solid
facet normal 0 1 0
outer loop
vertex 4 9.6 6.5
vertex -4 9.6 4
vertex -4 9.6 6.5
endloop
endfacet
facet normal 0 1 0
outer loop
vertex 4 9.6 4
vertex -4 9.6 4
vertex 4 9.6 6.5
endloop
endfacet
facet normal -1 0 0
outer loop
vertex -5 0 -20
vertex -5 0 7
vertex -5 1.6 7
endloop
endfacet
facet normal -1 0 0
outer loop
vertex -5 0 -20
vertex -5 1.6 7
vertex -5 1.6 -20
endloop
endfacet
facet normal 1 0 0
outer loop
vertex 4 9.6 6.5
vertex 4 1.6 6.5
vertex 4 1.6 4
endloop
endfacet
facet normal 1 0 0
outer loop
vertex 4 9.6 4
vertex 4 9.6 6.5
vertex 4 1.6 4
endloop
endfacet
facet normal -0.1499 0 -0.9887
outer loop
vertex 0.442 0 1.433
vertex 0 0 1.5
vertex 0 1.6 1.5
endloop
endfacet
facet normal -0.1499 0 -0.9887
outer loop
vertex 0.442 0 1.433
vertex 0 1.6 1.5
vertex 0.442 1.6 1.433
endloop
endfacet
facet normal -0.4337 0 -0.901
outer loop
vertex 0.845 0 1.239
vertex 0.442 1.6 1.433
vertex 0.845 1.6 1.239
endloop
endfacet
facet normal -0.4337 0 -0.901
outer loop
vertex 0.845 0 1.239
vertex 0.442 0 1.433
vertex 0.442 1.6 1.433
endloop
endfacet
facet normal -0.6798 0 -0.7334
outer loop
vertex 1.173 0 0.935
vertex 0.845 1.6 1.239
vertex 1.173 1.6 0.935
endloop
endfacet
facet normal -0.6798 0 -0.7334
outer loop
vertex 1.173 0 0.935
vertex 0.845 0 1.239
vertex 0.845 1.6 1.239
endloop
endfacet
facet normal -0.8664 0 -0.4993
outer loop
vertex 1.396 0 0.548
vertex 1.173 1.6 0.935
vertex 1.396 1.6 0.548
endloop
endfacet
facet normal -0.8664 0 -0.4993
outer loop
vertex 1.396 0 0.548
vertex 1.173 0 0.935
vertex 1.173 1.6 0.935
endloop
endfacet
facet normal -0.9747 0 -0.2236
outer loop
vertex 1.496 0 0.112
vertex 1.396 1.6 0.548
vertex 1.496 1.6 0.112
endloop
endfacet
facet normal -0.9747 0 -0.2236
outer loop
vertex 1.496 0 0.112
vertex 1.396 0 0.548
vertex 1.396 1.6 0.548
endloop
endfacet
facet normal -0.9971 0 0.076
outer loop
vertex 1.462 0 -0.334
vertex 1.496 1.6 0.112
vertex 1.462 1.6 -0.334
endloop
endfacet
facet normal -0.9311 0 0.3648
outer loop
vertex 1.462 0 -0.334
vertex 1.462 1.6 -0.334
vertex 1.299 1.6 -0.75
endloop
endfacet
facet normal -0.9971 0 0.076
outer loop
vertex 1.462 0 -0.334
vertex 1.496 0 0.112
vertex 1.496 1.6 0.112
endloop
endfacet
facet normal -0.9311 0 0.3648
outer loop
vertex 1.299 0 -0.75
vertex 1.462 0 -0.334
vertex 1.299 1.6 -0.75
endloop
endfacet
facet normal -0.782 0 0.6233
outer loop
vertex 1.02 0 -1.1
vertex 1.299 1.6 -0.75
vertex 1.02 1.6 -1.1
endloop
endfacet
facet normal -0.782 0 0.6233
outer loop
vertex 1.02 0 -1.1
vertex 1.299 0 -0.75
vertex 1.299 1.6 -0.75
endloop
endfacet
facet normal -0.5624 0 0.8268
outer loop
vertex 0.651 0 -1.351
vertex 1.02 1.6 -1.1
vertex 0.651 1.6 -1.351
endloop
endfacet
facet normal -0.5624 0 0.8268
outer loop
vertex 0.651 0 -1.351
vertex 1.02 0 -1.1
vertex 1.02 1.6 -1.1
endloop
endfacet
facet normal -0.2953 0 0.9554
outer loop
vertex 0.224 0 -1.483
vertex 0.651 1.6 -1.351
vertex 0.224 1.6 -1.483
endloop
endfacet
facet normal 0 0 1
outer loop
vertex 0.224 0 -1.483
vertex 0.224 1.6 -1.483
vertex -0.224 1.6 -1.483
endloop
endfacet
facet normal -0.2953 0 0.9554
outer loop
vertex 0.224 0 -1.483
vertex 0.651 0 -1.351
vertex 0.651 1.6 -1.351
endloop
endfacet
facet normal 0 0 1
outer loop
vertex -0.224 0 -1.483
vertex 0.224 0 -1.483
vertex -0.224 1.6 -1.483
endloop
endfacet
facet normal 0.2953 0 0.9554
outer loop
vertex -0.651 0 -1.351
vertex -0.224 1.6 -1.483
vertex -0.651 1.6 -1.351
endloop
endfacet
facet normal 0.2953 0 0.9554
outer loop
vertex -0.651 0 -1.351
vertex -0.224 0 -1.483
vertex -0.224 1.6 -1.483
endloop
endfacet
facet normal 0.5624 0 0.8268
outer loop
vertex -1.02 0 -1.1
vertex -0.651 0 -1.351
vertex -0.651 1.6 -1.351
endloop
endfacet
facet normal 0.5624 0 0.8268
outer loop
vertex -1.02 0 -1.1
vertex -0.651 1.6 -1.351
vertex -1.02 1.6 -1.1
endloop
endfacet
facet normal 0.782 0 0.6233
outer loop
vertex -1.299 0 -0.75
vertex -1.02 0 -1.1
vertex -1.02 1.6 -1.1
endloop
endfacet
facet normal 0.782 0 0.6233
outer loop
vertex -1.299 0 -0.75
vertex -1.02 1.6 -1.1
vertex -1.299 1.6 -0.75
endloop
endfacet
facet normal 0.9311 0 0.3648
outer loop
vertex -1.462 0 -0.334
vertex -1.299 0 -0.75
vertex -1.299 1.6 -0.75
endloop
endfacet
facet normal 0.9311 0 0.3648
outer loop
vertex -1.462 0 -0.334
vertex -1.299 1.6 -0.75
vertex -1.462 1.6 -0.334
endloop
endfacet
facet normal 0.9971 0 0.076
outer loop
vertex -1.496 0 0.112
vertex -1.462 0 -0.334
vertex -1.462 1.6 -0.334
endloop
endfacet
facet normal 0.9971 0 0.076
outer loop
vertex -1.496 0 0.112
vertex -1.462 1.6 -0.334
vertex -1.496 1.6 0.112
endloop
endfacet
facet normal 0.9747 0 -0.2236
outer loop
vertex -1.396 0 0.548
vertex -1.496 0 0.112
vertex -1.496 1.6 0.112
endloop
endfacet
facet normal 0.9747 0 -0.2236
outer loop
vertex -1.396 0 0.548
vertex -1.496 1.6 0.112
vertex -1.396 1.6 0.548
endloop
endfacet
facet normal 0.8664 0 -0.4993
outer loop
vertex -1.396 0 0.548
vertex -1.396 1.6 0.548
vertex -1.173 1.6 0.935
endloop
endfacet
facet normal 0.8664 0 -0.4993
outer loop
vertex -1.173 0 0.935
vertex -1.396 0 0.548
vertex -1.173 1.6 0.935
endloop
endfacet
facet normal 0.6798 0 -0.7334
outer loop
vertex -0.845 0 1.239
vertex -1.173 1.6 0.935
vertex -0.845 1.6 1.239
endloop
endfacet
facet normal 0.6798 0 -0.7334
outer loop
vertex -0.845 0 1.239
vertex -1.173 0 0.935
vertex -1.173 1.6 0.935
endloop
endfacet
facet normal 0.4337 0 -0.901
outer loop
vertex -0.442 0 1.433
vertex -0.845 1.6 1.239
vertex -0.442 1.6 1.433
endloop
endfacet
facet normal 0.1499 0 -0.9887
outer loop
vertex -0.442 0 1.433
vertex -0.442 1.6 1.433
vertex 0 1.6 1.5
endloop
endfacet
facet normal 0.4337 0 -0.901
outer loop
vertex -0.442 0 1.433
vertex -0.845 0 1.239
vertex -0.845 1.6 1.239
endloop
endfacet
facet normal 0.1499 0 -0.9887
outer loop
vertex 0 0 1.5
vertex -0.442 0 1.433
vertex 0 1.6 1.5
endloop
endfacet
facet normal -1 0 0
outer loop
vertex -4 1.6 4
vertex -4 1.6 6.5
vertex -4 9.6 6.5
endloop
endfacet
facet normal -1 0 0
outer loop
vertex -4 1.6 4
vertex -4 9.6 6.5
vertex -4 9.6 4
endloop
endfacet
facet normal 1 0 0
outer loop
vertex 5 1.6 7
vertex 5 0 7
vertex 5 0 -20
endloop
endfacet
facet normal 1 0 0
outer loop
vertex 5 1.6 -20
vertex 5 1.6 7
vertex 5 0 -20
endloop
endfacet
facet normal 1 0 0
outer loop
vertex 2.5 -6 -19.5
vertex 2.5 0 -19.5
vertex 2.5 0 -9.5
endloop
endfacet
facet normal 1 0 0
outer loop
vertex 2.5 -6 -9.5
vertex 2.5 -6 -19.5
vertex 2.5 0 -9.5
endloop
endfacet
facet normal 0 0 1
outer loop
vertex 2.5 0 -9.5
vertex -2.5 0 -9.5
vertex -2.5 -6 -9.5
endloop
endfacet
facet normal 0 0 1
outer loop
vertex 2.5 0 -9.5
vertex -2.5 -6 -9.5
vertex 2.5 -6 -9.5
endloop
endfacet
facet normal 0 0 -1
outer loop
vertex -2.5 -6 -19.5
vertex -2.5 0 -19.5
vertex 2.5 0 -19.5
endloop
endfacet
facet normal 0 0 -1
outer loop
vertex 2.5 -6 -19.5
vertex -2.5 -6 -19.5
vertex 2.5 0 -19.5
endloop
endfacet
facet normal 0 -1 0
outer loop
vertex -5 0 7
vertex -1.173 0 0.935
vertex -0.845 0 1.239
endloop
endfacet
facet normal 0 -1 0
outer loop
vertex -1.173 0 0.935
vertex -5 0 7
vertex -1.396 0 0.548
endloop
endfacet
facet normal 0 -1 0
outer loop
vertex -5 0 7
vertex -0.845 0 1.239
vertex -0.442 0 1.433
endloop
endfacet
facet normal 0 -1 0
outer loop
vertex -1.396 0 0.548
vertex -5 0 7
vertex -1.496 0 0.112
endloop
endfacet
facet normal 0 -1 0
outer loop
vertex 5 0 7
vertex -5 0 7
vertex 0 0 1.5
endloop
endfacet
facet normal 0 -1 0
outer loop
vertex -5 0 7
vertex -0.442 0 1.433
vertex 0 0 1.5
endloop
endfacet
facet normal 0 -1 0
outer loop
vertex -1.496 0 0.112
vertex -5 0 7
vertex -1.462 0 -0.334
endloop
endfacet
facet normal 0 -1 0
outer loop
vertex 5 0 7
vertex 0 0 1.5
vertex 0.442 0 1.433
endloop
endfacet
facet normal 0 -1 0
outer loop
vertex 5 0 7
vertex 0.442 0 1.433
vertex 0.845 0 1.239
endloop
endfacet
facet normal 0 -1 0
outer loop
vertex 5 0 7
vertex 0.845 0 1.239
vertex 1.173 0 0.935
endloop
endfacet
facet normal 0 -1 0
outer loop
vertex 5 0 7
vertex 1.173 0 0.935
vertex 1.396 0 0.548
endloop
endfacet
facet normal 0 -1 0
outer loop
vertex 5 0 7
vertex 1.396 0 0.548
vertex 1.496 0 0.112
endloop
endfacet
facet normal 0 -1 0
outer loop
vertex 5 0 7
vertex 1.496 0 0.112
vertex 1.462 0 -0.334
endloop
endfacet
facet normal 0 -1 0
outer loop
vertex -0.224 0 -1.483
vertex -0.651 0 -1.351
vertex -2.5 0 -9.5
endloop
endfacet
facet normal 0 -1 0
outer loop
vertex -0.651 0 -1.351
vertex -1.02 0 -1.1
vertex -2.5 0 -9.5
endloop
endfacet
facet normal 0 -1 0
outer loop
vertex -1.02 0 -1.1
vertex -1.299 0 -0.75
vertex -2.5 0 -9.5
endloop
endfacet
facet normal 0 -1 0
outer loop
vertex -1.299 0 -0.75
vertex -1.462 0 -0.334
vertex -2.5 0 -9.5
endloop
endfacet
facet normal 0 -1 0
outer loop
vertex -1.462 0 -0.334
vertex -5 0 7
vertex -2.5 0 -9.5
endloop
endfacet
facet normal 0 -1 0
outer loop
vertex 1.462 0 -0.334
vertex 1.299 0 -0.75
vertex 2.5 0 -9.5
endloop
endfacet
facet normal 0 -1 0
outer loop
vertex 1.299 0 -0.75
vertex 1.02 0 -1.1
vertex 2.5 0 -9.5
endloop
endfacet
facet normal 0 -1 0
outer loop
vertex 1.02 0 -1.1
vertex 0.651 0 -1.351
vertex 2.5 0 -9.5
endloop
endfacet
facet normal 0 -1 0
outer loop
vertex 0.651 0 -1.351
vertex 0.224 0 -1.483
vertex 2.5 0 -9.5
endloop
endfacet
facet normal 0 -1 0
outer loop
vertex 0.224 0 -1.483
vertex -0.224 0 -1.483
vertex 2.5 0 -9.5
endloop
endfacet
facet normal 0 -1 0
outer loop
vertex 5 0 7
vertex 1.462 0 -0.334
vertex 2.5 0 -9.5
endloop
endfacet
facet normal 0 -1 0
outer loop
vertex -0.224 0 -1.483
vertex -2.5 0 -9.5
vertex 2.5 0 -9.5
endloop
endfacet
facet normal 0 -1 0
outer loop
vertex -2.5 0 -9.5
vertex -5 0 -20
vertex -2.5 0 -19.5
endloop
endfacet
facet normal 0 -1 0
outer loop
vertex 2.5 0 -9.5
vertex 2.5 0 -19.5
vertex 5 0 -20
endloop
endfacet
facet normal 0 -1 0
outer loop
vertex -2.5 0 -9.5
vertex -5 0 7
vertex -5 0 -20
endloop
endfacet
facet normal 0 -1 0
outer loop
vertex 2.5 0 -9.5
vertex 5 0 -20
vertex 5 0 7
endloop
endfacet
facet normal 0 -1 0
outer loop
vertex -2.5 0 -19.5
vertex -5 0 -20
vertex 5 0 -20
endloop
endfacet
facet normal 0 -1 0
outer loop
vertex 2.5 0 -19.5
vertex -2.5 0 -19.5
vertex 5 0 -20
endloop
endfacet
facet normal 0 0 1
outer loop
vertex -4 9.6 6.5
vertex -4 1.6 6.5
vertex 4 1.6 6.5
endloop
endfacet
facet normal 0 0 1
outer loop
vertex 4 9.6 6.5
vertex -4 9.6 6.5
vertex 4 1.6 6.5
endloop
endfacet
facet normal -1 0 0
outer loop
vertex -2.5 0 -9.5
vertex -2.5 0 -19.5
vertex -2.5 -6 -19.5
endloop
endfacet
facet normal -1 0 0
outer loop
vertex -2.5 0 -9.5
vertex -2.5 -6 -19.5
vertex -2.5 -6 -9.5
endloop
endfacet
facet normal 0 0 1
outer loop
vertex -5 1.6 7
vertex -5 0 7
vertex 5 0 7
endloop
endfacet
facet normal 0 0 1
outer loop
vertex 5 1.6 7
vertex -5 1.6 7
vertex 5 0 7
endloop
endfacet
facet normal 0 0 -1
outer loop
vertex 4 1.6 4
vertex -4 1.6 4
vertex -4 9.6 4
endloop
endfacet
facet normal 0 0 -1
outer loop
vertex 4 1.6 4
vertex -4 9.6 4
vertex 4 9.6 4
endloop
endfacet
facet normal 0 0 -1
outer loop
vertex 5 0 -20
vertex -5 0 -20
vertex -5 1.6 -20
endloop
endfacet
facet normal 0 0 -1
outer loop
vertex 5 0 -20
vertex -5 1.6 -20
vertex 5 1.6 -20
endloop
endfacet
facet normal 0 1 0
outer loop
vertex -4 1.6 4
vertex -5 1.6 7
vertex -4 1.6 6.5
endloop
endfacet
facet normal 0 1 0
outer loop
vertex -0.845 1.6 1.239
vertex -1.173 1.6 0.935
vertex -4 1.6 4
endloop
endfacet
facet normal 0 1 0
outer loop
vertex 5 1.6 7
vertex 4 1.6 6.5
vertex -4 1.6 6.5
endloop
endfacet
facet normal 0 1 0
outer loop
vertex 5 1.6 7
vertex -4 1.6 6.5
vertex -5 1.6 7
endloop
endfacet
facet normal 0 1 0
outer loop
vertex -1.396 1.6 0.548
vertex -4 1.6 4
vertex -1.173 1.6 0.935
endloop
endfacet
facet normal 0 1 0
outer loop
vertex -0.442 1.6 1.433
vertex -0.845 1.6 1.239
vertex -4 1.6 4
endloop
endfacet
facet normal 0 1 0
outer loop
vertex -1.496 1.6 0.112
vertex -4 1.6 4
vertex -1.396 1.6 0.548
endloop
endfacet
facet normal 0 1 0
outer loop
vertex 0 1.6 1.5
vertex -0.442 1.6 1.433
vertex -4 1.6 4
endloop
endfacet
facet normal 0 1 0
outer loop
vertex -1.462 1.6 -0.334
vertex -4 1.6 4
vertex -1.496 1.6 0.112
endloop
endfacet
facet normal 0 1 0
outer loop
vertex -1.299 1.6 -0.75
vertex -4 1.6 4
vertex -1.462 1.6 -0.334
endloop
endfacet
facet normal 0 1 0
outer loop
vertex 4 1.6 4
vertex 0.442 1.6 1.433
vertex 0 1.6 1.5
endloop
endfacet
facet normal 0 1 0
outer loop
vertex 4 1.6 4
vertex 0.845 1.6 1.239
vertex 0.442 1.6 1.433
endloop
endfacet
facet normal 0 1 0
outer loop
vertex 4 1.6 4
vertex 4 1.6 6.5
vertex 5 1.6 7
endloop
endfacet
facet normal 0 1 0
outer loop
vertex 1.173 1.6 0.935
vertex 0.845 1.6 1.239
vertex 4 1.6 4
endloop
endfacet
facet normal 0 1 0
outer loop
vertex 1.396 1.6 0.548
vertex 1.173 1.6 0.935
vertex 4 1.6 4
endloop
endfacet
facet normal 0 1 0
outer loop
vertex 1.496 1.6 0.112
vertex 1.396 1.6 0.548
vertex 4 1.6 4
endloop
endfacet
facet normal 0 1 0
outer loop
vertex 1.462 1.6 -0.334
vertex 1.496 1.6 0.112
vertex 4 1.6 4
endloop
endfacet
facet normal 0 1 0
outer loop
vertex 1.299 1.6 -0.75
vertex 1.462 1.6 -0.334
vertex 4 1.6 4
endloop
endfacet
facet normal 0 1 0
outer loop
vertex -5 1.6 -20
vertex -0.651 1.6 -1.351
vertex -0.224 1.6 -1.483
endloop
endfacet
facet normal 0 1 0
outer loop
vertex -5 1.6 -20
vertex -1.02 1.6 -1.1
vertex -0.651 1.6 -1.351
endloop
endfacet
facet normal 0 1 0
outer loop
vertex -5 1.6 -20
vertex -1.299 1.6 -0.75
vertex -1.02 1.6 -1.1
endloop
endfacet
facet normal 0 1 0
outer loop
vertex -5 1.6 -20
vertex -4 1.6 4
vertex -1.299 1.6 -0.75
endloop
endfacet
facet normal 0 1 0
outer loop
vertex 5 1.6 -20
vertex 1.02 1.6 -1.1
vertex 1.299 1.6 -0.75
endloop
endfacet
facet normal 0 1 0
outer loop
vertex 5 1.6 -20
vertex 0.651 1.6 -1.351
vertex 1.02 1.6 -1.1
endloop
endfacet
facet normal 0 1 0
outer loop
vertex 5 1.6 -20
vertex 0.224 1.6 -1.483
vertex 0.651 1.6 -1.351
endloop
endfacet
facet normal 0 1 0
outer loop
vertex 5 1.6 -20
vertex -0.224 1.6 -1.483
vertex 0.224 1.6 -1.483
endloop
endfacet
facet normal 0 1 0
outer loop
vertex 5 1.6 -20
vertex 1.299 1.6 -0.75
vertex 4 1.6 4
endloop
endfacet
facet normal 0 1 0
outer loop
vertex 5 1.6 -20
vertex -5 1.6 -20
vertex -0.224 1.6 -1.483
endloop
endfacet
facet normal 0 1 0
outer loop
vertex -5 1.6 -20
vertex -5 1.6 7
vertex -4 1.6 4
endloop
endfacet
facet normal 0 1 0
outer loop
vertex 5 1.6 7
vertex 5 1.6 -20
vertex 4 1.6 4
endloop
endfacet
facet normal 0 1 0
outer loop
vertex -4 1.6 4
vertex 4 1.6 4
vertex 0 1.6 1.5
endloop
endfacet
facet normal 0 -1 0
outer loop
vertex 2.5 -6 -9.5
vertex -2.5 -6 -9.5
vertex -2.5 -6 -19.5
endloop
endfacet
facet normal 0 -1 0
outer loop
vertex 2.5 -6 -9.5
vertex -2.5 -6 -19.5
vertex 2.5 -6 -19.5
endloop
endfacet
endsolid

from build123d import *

# Parameters (mm, degrees)
SKETCH_1_W      = 10
SKETCH_1_H      = 27
SKETCH_1_R      = 1.5
EXTRUDE_1_DEPTH = 1.6
SKETCH_2_W      = 8
SKETCH_2_H      = 2.5
EXTRUDE_2_DEPTH = 8
SKETCH_3_W      = 5
SKETCH_3_H      = 10
EXTRUDE_3_DEPTH = 6


with BuildPart() as part:
    # 草图1 → 凸台-拉伸1 (new body)
    with BuildSketch(Plane(origin=(0, 0, 0), x_dir=(1, 0, 0), z_dir=(0, 1, 0))):
        with Locations((0, 6.5)):
            Rectangle(SKETCH_1_W, SKETCH_1_H)
        with Locations(Location((0, 0, 0), (0, 0, 270))):
            Circle(SKETCH_1_R, mode=Mode.SUBTRACT)
    extrude(amount=EXTRUDE_1_DEPTH)

    # 草图2 → 凸台-拉伸2 (add)
    with BuildSketch(Plane(origin=(0, 1.6, 0), x_dir=(1, 0, 0), z_dir=(0, 1, 0))):
        with Locations((0, -5.25)):
            Rectangle(SKETCH_2_W, SKETCH_2_H)
    extrude(amount=EXTRUDE_2_DEPTH)

    # 草图3 → 凸台-拉伸3 (add)
    with BuildSketch(Plane.XZ):
        with Locations((0, -14.5)):
            Rectangle(SKETCH_3_W, SKETCH_3_H)
    extrude(amount=EXTRUDE_3_DEPTH)


solid = part.part
